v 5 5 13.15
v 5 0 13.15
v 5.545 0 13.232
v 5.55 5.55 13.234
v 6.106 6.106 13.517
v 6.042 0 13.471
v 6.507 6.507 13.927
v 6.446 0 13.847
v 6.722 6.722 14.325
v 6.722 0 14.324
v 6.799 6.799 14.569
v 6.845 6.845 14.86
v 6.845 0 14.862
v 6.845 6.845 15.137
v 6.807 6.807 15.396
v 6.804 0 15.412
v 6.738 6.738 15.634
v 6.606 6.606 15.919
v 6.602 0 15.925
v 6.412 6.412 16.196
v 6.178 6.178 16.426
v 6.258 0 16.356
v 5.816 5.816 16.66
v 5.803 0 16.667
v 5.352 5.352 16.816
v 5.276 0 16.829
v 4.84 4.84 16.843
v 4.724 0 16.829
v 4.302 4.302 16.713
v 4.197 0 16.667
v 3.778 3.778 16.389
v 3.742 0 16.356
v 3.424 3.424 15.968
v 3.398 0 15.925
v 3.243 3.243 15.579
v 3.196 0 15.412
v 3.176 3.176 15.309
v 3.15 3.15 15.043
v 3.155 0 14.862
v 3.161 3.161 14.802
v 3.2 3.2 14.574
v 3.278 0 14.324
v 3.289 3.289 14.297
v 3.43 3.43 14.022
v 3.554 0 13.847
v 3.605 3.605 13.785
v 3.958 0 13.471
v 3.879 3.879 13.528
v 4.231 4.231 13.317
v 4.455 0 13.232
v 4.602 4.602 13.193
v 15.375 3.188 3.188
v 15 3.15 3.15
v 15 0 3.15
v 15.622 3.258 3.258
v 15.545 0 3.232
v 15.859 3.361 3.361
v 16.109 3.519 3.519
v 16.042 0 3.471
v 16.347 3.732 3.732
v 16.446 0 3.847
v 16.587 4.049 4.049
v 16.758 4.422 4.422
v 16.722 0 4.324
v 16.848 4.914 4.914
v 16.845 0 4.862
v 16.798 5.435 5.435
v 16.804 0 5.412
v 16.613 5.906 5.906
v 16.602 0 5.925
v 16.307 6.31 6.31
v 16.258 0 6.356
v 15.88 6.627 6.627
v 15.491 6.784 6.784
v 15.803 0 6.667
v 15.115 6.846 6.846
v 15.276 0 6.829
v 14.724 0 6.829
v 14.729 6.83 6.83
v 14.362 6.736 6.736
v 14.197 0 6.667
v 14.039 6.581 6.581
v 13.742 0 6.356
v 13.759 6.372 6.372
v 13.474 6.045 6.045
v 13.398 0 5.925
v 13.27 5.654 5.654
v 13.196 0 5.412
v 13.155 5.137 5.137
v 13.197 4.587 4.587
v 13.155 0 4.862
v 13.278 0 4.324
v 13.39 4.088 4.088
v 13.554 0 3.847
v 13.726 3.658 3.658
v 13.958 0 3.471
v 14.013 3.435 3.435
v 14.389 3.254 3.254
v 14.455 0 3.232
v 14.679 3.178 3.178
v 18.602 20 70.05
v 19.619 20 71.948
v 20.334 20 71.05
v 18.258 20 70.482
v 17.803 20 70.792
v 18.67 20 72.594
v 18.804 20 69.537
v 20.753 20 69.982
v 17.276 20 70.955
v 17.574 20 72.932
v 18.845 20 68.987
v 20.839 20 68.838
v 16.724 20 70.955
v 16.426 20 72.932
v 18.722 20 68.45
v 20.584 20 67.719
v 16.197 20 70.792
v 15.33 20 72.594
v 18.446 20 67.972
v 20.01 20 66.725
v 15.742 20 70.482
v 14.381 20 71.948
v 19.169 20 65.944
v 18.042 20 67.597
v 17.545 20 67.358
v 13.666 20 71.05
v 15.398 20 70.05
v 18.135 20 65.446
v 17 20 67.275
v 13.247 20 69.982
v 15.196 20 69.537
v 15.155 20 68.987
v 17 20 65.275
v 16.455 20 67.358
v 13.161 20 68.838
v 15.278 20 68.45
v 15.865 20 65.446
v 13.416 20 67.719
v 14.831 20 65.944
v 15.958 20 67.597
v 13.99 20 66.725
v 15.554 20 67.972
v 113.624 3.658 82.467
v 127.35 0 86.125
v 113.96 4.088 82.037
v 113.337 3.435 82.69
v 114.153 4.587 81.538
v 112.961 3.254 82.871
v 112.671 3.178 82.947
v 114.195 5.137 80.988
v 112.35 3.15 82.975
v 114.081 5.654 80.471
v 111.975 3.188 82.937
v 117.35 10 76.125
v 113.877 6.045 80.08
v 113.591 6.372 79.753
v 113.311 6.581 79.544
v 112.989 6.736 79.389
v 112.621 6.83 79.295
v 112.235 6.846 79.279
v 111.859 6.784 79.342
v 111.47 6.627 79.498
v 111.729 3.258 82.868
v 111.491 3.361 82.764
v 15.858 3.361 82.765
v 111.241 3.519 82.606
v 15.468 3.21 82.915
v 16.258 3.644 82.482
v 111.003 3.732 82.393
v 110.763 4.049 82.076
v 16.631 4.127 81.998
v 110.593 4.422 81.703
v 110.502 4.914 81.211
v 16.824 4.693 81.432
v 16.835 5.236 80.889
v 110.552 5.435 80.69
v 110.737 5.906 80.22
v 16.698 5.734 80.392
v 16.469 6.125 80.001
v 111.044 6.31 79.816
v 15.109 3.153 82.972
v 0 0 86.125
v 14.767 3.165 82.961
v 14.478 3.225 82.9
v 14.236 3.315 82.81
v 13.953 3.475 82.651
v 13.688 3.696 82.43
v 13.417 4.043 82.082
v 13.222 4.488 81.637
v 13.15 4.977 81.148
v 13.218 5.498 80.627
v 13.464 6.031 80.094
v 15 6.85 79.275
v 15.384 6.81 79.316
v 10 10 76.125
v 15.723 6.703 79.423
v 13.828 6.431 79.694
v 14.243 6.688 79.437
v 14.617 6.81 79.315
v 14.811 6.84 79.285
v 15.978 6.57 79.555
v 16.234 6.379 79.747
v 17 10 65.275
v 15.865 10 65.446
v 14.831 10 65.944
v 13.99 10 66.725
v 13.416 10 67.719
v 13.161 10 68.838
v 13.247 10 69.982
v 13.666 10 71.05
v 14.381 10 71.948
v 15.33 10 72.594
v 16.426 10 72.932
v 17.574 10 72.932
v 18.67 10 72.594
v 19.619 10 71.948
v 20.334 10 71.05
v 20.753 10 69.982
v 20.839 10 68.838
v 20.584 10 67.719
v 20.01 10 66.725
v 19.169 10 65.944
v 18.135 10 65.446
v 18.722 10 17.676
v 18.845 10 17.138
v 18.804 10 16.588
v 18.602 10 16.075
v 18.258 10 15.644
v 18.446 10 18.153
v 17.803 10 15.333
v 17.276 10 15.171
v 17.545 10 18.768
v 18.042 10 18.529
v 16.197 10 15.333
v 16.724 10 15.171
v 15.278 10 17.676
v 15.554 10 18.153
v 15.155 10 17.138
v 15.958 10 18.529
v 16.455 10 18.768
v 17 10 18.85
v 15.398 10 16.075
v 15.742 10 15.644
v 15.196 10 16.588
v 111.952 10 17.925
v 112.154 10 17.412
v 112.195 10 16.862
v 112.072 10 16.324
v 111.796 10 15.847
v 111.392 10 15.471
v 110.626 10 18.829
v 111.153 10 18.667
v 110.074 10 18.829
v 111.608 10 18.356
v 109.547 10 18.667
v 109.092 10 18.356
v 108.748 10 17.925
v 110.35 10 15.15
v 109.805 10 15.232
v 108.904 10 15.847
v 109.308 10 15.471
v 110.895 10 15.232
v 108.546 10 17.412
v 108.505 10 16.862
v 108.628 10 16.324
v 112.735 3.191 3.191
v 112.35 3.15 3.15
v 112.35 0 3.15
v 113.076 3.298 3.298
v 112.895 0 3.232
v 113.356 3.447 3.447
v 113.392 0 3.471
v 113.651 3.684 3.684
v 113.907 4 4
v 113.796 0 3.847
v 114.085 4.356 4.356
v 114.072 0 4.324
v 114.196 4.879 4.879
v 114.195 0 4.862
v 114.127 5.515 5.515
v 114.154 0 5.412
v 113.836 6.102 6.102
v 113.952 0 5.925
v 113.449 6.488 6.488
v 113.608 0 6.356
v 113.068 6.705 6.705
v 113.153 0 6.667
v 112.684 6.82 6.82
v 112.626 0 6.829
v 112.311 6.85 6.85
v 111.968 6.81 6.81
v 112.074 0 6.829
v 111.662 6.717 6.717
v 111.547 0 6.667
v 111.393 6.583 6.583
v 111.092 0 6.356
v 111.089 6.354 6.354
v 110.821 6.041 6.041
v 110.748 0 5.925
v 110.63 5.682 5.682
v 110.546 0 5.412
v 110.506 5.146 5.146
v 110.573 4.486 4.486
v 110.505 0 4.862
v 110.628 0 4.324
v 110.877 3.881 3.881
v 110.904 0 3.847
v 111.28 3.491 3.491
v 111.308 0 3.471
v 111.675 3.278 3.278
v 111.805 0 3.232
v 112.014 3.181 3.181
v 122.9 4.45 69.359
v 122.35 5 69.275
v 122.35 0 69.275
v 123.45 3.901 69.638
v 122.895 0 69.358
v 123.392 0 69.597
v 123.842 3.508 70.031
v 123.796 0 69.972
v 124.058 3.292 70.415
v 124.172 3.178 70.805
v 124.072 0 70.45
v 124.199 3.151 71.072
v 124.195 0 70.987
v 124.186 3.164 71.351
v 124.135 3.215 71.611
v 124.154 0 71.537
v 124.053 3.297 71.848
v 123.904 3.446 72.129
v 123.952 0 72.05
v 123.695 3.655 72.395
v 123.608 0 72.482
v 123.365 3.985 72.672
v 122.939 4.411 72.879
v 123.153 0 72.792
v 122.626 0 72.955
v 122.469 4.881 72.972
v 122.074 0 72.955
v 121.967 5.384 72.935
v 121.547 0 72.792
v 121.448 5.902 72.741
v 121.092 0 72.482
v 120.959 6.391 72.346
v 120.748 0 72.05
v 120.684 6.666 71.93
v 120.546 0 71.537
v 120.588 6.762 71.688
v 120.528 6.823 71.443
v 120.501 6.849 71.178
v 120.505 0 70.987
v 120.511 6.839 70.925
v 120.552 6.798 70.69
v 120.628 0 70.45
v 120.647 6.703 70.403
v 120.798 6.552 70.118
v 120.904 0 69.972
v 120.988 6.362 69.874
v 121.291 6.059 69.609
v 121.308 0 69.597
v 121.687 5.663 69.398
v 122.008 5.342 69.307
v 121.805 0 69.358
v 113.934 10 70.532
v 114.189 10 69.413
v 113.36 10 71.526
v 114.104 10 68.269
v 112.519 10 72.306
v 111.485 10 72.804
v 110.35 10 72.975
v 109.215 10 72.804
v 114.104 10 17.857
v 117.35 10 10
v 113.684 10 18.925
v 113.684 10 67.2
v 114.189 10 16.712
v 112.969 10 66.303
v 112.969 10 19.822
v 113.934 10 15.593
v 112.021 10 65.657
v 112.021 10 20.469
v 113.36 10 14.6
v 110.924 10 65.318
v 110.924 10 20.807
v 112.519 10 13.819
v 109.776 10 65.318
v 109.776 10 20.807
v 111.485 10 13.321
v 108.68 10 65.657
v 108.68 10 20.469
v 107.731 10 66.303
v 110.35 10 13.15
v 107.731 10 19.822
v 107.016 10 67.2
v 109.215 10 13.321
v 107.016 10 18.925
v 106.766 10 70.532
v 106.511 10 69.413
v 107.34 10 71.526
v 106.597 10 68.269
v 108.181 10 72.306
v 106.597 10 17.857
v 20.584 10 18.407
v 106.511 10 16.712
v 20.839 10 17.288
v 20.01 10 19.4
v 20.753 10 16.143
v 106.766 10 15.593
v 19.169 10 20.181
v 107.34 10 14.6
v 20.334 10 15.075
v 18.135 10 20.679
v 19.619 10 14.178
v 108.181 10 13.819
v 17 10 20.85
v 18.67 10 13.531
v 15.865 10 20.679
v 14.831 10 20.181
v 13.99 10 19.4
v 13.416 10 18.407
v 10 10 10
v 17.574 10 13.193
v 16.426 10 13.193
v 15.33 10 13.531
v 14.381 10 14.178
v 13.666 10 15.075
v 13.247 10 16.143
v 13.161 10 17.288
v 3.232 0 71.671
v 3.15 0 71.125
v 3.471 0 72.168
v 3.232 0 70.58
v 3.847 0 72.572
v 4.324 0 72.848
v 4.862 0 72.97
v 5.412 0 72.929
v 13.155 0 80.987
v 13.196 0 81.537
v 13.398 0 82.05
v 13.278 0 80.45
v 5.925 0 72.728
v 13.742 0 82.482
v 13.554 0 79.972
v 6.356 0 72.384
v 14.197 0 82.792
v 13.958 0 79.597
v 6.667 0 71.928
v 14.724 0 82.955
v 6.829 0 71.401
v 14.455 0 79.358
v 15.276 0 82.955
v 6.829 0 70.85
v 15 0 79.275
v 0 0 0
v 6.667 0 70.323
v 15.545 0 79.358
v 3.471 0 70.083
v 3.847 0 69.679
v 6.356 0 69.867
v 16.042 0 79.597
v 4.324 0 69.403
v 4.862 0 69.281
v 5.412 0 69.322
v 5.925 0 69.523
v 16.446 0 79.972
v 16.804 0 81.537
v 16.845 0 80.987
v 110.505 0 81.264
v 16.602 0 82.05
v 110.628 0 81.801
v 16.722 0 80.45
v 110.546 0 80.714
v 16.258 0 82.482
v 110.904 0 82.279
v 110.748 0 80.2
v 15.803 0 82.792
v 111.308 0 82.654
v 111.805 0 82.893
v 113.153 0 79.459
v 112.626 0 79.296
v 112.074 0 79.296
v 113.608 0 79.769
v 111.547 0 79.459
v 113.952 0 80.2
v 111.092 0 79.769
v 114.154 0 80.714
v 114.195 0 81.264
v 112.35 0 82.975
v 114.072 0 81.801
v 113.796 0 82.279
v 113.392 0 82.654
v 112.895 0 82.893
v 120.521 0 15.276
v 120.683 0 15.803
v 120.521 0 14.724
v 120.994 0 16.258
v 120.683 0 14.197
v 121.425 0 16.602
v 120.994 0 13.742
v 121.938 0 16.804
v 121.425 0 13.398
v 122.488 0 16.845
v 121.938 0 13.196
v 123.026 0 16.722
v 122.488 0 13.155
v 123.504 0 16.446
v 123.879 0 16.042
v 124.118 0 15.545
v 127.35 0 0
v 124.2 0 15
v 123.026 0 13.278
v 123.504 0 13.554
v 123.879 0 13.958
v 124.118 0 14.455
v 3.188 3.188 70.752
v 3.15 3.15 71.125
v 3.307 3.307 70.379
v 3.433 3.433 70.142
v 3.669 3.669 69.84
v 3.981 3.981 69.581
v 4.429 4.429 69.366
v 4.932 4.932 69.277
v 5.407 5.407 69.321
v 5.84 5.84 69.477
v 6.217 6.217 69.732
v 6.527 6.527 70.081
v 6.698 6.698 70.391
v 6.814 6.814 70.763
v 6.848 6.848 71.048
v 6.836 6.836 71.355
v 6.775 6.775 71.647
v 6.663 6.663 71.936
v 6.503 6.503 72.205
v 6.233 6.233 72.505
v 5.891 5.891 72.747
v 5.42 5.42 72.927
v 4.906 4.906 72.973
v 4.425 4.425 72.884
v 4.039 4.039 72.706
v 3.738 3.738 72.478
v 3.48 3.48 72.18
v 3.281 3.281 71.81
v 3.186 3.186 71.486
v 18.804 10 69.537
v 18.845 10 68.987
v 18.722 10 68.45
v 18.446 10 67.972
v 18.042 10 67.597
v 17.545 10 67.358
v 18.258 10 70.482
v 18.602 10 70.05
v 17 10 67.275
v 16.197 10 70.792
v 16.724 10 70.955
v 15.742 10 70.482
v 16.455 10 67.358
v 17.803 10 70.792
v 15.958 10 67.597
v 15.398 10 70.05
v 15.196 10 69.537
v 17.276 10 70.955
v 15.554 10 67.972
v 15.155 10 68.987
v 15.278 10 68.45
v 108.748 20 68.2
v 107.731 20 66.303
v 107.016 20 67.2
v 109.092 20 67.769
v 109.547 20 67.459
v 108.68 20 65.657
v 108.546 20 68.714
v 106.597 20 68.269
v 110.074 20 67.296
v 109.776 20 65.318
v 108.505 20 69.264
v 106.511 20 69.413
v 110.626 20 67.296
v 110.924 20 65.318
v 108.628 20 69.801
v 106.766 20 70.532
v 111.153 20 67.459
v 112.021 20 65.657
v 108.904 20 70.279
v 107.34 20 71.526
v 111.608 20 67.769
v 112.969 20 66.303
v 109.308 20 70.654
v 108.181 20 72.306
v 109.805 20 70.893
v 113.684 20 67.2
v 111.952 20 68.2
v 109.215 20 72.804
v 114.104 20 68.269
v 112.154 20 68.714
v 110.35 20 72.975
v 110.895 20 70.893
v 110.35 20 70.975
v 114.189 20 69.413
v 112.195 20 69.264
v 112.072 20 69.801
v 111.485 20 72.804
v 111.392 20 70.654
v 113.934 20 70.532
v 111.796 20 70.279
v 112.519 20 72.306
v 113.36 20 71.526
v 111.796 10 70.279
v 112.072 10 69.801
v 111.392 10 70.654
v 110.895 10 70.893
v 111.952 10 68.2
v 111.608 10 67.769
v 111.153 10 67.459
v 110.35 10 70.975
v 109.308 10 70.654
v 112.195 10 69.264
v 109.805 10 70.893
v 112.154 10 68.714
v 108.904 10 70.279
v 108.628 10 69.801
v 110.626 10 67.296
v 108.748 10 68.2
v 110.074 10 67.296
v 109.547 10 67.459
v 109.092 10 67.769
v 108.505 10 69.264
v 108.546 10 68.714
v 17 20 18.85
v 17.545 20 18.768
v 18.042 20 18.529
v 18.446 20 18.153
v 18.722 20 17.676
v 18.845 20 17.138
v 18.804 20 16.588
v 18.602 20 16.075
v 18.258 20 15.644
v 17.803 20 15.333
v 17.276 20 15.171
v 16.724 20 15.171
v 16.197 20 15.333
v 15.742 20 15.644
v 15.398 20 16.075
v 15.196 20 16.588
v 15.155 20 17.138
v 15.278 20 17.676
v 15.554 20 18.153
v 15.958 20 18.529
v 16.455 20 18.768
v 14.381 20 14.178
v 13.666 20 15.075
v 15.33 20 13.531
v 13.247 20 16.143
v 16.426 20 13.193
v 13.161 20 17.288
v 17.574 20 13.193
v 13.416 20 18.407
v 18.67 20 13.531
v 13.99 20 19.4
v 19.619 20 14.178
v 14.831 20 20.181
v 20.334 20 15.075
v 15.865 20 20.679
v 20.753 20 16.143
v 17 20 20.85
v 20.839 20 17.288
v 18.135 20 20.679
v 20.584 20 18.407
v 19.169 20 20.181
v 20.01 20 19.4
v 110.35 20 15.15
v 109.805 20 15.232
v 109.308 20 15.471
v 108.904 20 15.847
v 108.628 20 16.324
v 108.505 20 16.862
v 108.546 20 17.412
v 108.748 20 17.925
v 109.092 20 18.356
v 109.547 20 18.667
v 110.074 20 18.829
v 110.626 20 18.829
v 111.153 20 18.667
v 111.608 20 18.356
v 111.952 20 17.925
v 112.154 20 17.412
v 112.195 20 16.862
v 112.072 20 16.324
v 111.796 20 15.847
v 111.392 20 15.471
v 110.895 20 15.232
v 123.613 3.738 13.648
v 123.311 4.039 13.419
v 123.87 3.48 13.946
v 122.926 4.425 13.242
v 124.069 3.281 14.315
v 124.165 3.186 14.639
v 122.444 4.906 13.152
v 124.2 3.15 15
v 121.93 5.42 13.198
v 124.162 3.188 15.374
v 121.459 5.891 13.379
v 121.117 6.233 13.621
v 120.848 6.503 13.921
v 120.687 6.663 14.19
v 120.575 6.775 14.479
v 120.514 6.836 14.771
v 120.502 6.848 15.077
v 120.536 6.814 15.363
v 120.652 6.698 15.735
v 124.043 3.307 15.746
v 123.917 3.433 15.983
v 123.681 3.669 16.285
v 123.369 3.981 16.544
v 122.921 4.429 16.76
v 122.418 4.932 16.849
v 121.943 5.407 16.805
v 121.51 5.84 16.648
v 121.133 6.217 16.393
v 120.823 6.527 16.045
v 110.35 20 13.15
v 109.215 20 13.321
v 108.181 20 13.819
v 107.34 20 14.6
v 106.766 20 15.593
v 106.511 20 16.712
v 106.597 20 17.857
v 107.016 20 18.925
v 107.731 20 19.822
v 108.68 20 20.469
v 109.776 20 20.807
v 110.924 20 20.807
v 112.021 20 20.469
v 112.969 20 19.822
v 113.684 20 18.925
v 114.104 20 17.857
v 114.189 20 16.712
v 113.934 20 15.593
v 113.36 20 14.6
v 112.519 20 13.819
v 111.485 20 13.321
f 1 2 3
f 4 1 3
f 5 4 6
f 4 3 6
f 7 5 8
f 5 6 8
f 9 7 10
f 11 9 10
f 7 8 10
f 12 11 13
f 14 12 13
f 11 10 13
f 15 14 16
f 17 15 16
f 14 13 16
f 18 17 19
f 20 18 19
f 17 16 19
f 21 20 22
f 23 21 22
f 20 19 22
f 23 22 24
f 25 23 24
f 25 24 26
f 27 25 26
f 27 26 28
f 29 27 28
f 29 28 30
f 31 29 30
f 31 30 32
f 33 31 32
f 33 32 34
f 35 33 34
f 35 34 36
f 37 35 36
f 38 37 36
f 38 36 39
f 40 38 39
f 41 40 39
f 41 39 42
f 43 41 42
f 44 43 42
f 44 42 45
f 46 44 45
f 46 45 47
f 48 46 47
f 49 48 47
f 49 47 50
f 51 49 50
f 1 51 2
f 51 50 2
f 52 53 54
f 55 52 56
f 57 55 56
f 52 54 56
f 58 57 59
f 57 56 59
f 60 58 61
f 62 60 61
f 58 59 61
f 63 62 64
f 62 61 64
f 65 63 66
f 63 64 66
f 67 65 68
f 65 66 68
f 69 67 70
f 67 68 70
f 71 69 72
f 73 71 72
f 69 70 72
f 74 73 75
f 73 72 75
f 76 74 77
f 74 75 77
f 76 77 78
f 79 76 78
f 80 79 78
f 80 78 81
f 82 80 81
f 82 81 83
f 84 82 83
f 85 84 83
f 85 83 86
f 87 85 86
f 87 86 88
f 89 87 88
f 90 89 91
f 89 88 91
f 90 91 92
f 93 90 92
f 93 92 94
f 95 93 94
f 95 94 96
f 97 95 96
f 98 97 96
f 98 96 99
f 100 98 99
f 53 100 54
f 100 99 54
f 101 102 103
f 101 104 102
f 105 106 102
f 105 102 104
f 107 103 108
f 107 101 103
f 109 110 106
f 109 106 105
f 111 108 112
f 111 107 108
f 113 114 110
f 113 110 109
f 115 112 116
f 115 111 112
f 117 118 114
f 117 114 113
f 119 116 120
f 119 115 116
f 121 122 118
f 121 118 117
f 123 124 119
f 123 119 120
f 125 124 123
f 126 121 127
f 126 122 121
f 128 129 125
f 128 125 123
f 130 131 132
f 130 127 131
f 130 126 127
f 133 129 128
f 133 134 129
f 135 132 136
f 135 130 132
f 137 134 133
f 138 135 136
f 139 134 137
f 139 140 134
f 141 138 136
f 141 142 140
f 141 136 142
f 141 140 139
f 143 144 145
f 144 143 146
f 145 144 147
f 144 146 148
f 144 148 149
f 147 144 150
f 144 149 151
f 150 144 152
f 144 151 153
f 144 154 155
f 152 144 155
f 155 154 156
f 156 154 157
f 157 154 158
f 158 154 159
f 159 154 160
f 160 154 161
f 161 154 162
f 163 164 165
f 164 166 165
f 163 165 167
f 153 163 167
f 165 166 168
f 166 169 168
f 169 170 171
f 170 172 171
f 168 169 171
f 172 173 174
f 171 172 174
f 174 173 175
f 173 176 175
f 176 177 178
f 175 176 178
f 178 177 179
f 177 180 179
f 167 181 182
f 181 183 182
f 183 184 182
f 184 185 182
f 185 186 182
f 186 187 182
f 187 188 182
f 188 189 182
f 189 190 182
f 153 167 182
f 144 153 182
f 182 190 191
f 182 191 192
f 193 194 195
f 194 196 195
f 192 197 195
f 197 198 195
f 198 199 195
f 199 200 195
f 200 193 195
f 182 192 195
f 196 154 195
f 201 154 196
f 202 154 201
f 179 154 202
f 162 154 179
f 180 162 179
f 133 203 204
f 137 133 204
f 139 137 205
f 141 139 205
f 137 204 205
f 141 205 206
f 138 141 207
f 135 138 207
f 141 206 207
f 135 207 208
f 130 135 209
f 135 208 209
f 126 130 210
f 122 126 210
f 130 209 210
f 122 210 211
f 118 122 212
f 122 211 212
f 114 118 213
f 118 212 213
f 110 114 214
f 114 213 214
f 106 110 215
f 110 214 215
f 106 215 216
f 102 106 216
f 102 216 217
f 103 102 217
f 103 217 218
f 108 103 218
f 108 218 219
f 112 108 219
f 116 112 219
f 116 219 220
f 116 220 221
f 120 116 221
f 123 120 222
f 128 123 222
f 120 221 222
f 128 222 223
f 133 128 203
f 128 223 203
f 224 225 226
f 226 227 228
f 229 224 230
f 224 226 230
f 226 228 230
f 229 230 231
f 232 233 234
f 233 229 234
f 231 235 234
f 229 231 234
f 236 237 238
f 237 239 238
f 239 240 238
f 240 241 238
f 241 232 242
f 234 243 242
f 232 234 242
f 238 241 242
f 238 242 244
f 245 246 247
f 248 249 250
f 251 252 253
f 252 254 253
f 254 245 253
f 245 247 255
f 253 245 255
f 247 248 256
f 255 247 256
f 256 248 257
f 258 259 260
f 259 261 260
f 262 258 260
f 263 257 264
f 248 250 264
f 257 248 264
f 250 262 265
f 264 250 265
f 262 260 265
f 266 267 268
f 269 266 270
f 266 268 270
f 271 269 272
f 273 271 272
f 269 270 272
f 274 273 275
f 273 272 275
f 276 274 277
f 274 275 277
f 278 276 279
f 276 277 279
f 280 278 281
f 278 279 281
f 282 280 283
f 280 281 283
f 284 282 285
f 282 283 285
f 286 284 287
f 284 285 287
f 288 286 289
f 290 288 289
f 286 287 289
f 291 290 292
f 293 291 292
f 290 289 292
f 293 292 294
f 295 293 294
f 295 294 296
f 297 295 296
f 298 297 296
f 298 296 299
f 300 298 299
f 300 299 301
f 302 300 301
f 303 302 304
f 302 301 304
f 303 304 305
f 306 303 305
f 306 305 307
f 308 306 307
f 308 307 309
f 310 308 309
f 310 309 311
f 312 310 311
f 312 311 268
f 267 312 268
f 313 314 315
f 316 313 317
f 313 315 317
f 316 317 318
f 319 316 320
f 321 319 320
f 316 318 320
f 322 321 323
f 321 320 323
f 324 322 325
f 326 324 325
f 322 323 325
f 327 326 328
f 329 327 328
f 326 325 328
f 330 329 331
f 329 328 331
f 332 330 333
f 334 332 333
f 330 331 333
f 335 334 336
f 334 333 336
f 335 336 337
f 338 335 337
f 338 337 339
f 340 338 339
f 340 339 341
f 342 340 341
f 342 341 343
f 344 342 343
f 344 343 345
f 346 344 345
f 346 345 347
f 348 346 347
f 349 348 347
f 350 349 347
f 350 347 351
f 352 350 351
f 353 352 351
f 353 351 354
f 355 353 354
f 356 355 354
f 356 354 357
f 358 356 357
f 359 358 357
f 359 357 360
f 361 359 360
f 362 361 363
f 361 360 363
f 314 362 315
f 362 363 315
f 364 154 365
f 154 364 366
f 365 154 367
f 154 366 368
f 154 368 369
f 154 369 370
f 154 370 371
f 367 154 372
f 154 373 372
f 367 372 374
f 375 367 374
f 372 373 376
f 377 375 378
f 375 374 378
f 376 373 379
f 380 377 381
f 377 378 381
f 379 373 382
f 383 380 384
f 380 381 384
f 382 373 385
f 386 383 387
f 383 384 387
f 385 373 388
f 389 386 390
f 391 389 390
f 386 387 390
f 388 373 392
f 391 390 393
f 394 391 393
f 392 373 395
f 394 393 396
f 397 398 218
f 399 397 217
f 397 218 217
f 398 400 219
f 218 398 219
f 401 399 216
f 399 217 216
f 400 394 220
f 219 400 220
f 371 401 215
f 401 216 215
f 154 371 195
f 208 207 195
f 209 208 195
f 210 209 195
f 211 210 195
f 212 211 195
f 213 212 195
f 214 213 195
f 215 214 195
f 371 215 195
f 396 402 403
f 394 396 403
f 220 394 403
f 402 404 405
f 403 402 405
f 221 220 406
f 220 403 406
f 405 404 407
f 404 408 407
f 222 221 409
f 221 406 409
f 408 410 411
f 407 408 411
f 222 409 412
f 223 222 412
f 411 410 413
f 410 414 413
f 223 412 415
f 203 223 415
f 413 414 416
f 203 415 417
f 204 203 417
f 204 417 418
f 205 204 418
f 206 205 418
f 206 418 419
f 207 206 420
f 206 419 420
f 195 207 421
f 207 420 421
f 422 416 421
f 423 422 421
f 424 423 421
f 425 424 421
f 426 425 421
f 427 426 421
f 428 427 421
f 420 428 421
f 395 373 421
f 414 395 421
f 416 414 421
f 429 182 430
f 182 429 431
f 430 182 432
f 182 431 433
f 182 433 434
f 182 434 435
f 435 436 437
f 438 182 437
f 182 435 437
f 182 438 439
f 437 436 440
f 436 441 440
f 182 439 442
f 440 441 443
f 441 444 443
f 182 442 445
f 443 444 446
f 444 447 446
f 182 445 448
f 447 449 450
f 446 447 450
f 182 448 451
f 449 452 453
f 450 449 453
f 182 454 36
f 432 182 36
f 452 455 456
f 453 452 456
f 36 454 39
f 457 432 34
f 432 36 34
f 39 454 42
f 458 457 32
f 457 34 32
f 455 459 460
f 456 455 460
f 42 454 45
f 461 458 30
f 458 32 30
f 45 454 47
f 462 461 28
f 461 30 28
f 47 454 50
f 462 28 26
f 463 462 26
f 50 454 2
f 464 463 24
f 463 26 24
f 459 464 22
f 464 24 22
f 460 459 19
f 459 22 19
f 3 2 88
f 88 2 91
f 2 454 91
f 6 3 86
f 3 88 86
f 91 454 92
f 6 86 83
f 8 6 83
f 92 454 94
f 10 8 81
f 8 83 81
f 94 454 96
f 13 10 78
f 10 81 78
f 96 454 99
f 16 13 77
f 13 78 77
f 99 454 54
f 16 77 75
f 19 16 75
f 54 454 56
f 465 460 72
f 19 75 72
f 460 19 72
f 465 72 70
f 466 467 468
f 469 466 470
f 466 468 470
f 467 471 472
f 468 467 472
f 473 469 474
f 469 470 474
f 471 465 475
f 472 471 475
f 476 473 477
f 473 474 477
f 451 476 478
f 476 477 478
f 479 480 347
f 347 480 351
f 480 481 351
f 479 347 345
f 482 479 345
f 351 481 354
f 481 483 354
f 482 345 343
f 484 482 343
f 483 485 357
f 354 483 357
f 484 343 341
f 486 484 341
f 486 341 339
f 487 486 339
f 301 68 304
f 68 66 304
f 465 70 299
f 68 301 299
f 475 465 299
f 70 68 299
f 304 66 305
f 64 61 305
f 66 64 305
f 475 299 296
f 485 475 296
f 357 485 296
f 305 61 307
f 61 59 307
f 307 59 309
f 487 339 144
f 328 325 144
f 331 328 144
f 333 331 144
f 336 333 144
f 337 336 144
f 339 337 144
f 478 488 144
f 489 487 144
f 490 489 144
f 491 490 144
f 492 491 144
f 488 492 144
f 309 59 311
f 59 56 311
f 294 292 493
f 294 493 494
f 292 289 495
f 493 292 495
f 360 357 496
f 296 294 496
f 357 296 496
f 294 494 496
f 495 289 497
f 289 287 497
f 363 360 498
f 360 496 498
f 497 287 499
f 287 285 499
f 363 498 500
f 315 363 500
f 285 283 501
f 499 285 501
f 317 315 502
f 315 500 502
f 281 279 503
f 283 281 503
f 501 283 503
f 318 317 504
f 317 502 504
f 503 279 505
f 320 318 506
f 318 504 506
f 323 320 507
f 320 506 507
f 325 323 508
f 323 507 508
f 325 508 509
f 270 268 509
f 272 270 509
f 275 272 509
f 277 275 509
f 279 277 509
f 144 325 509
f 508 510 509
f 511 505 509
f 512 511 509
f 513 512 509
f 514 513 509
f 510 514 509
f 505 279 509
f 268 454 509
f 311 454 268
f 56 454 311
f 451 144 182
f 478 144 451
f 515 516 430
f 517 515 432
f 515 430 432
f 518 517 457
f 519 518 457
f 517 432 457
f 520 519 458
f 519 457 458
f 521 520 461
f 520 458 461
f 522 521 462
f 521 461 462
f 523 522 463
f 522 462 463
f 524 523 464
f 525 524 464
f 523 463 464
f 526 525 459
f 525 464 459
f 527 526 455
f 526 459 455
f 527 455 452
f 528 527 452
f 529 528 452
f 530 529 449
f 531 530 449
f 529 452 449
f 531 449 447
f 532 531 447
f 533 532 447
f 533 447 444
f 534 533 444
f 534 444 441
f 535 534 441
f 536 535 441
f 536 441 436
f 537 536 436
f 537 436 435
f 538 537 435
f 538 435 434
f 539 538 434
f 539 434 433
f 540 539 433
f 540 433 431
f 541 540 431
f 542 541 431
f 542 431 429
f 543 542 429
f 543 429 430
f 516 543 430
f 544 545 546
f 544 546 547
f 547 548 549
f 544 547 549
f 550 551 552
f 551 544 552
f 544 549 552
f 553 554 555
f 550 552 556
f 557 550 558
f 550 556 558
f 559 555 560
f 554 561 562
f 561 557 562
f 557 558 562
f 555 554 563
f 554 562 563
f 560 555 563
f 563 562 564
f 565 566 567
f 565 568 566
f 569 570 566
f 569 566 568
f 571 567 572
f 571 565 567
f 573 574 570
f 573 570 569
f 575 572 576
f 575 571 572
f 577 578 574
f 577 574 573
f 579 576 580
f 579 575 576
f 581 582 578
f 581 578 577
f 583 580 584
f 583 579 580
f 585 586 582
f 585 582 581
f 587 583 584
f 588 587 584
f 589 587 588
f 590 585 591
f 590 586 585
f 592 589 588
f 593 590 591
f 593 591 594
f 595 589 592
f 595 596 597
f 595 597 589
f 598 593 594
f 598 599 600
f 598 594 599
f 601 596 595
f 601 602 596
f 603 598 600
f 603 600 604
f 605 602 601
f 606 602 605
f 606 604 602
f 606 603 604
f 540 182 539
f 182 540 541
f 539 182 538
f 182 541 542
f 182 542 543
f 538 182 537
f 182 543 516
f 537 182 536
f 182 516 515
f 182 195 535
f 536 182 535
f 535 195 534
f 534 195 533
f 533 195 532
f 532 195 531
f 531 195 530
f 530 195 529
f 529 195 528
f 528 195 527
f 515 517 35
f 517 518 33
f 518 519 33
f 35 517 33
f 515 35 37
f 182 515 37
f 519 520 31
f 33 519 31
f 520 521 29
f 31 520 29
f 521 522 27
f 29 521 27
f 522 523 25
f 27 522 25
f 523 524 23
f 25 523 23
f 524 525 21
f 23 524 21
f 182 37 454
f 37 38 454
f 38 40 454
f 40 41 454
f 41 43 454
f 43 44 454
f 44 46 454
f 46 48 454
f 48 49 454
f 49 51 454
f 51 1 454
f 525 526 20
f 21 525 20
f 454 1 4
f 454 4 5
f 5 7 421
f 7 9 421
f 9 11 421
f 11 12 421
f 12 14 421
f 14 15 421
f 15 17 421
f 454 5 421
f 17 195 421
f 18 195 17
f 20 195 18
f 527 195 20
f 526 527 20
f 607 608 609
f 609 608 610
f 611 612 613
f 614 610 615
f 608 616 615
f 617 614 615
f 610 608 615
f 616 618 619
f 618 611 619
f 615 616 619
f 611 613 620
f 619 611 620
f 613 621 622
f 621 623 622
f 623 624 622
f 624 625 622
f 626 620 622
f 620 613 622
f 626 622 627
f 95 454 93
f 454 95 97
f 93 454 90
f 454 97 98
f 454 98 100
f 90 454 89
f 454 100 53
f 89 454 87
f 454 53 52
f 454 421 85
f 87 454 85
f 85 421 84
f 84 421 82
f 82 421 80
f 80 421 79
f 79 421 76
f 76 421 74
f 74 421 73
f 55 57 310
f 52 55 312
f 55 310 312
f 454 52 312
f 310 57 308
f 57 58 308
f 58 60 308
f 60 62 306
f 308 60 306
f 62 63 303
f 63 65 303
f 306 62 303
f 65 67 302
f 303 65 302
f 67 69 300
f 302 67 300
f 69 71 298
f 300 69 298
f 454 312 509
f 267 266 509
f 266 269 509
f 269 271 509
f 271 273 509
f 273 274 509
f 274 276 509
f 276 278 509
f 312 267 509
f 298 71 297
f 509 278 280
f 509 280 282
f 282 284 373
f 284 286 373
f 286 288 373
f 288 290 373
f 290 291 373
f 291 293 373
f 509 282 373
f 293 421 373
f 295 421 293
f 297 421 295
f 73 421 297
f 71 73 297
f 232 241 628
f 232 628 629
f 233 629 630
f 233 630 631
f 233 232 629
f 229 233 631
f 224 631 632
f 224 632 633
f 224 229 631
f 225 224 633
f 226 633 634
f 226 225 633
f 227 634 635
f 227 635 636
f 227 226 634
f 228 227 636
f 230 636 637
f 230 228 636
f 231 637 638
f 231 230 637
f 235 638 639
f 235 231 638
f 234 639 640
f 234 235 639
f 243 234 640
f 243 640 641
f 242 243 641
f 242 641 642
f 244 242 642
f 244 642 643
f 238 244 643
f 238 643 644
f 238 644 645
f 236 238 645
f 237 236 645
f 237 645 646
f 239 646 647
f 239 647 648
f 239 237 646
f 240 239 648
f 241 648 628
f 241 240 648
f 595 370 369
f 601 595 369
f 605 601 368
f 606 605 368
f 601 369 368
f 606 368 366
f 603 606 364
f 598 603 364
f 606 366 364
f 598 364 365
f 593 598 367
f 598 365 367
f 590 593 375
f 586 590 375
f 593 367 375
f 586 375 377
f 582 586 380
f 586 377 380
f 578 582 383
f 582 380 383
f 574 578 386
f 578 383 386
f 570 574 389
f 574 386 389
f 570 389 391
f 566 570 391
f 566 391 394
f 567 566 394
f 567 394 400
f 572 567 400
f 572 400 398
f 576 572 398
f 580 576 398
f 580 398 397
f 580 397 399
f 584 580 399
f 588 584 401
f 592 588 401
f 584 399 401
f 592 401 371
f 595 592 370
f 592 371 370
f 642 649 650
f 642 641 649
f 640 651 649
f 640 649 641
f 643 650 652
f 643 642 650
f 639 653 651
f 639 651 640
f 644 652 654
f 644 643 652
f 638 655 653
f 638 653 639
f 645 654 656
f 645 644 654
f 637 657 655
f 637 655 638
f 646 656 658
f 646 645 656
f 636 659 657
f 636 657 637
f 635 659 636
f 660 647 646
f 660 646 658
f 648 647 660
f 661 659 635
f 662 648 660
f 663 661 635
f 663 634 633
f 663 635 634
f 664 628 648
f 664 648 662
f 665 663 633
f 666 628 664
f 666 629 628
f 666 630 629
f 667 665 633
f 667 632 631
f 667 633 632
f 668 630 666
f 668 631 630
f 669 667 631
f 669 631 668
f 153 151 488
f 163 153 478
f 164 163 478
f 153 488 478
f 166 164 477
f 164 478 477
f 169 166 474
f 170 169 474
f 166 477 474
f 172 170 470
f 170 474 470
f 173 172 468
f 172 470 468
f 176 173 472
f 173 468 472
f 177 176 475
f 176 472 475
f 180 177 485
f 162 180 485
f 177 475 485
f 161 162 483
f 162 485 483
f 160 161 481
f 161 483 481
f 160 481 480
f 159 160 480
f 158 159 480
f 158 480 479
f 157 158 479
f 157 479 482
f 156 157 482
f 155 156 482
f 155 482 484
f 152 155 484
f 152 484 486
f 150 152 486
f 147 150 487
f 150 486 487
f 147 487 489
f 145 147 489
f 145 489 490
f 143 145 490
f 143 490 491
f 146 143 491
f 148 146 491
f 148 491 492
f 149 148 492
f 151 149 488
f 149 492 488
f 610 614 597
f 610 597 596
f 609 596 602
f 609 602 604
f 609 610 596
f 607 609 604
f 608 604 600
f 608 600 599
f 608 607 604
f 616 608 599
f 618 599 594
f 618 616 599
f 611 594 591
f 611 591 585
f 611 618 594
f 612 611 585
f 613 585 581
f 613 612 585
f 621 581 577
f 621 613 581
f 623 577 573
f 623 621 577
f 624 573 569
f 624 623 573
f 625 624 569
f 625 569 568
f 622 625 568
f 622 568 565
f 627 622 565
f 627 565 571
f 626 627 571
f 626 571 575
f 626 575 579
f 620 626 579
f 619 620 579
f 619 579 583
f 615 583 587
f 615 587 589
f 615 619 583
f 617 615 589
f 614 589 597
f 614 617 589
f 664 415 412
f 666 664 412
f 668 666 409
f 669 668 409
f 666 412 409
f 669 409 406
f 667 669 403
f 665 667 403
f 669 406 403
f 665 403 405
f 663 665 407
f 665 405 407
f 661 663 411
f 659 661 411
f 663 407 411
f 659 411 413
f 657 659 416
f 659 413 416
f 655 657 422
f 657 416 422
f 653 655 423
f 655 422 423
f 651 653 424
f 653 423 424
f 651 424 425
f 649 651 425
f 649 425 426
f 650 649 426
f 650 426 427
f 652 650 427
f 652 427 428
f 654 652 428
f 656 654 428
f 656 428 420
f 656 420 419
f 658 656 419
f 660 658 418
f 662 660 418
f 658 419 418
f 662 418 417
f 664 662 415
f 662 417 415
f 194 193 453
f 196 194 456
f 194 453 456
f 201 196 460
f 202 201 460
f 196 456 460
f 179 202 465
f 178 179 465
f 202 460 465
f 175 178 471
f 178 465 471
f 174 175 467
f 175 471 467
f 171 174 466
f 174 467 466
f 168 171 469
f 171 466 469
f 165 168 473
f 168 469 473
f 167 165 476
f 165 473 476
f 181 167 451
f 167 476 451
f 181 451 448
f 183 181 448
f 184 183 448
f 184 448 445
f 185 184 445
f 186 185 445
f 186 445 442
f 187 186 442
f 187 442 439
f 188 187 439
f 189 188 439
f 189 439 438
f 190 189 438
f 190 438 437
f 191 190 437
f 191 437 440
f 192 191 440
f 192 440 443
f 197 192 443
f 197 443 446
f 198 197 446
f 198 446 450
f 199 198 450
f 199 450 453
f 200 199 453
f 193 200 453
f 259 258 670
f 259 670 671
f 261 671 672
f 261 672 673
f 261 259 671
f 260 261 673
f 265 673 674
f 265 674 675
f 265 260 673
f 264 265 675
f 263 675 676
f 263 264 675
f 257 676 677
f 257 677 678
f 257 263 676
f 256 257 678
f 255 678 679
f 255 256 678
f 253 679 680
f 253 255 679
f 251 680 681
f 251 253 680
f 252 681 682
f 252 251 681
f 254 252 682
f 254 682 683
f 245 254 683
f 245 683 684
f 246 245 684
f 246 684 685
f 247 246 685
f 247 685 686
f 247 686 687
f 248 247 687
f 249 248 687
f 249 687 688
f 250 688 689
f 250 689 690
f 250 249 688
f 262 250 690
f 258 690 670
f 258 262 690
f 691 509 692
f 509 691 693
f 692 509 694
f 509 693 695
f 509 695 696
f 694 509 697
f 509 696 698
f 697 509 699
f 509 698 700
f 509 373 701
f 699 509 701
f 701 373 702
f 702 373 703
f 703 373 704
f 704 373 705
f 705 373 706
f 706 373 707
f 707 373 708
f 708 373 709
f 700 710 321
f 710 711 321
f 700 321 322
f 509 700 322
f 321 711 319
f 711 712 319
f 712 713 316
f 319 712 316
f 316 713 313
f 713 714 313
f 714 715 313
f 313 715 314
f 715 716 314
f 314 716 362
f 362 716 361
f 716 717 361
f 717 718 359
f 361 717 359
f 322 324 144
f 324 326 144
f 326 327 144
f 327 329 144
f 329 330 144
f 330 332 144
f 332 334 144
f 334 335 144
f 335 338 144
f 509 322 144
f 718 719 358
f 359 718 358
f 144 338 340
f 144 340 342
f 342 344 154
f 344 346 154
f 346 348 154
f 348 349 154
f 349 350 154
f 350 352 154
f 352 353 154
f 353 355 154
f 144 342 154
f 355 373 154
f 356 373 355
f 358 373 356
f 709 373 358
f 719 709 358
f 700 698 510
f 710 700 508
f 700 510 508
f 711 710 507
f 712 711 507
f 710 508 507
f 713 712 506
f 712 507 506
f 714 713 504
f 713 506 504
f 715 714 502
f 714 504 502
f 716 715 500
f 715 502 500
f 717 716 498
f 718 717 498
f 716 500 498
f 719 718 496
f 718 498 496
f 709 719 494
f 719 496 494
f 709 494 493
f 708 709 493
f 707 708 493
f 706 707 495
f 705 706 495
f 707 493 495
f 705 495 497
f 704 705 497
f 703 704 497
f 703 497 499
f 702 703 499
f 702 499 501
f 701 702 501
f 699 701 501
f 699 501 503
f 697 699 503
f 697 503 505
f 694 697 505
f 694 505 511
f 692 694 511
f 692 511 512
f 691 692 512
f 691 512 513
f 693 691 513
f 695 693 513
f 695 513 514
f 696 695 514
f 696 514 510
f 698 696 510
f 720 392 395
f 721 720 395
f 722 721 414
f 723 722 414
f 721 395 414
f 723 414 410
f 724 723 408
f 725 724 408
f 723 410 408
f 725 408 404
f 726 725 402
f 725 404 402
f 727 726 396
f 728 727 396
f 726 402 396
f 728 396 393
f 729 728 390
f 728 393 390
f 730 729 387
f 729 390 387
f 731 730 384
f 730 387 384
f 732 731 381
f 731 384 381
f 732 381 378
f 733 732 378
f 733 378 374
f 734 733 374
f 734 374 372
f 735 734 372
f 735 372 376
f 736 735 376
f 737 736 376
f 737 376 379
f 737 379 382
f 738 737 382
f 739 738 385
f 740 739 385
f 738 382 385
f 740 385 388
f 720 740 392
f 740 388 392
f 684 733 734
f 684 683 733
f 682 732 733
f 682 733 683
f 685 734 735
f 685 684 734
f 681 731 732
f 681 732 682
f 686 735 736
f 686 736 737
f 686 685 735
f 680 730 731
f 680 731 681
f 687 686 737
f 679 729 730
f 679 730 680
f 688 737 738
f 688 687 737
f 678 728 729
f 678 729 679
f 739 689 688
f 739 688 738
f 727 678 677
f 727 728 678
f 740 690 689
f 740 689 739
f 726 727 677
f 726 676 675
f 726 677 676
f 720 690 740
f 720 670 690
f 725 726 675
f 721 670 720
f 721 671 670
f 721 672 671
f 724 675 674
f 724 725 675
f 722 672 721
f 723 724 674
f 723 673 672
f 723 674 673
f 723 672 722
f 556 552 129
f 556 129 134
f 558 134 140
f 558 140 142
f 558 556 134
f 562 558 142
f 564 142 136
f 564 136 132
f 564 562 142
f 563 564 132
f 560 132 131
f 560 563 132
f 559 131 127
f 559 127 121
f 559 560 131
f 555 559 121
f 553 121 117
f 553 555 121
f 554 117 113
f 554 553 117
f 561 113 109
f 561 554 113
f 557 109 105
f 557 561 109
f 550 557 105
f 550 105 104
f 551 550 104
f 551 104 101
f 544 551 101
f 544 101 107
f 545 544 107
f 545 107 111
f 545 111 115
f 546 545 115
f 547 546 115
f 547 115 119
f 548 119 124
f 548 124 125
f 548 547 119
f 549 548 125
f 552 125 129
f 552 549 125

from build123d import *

# Parameters (mm, degrees)
SKETCH3_R           = 1.85
CUT_EXTRUDE1_DEPTH  = 155.06371723
SKETCH4_R           = 3.85
SKETCH4_R_2         = 1.85
BOSS_EXTRUDE1_DEPTH = 10


with BuildPart() as part:
    # Sketch1 → Loft1 section 0
    with BuildSketch(Plane(origin=(0, 0, 0), x_dir=(1, 0, 0), z_dir=(0, 1, 0))):
        with BuildLine():
            Line((0, 0), (127.35007717, 0))
            Line((127.35007717, 0), (127.35007717, -86.125413014))
            Line((127.35007717, -86.125413014), (0, -86.125413014))
            Line((0, -86.125413014), (0, 0))
        make_face()
    # Sketch2 → Loft1 section 1
    with BuildSketch(Plane(origin=(0, 10, 0), x_dir=(1, 0, 0), z_dir=(0, 1, 0))):
        with BuildLine():
            Line((10, -10), (10, -76.125413014))
            Line((10, -76.125413014), (117.35007717, -76.125413014))
            Line((117.35007717, -76.125413014), (117.35007717, -10))
            Line((117.35007717, -10), (10, -10))
        make_face()
    loft()

    # Sketch3 → Cut-Extrude1 (cut, through all)
    with BuildSketch(Plane.XZ):
        with Locations(Location((5, 15, 0), (0, 0, 270))):
            Circle(SKETCH3_R)
        with Locations(Location((5, 71.125413014, 0), (0, 0, 180))):
            Circle(SKETCH3_R)
        with Locations(Location((122.35007717, 71.125413014, 0), (0, 0, 270))):
            Circle(SKETCH3_R)
        with Locations((122.35007717, 15)):
            Circle(SKETCH3_R)
        with Locations(Location((15, 5, 0), (0, 0, 270))):
            Circle(SKETCH3_R)
        with Locations(Location((15, 81.125413014, 0), (0, 0, 270))):
            Circle(SKETCH3_R)
        with Locations(Location((112.35007717, 81.125413014, 0), (0, 0, 90))):
            Circle(SKETCH3_R)
        with Locations(Location((112.35007717, 5, 0), (0, 0, 270))):
            Circle(SKETCH3_R)
    extrude(amount=-CUT_EXTRUDE1_DEPTH, mode=Mode.SUBTRACT)

    # Sketch4 → Boss-Extrude1 (add)
    # profile 1 of 4: a face of its own
    with BuildSketch(Plane(origin=(0, 10, 0), x_dir=(1, 0, 0), z_dir=(0, 1, 0))):
        with Locations(Location((110.35007717, -69.125413014, 0), (0, 0, 270))):
            Circle(SKETCH4_R)
        with Locations(Location((110.35007717, -69.125413014, 0), (0, 0, 270))):
            Circle(SKETCH4_R_2, mode=Mode.SUBTRACT)
    # profile 2 of 4: a face of its own
    with BuildSketch(Plane(origin=(0, 10, 0), x_dir=(1, 0, 0), z_dir=(0, 1, 0))):
        with Locations(Location((110.35007717, -17, 0), (0, 0, 90))):
            Circle(SKETCH4_R)
        with Locations(Location((110.35007717, -17, 0), (0, 0, 90))):
            Circle(SKETCH4_R_2, mode=Mode.SUBTRACT)
    # profile 3 of 4: a face of its own
    with BuildSketch(Plane(origin=(0, 10, 0), x_dir=(1, 0, 0), z_dir=(0, 1, 0))):
        with Locations(Location((17, -17, 0), (0, 0, 270))):
            Circle(SKETCH4_R)
        with Locations(Location((17, -17, 0), (0, 0, 270))):
            Circle(SKETCH4_R_2, mode=Mode.SUBTRACT)
    # profile 4 of 4: a face of its own
    with BuildSketch(Plane(origin=(0, 10, 0), x_dir=(1, 0, 0), z_dir=(0, 1, 0))):
        with Locations(Location((17, -69.125413014, 0), (0, 0, 90))):
            Circle(SKETCH4_R)
        with Locations(Location((17, -69.125413014, 0), (0, 0, 90))):
            Circle(SKETCH4_R_2, mode=Mode.SUBTRACT)
    extrude(amount=BOSS_EXTRUDE1_DEPTH)


solid = part.part
